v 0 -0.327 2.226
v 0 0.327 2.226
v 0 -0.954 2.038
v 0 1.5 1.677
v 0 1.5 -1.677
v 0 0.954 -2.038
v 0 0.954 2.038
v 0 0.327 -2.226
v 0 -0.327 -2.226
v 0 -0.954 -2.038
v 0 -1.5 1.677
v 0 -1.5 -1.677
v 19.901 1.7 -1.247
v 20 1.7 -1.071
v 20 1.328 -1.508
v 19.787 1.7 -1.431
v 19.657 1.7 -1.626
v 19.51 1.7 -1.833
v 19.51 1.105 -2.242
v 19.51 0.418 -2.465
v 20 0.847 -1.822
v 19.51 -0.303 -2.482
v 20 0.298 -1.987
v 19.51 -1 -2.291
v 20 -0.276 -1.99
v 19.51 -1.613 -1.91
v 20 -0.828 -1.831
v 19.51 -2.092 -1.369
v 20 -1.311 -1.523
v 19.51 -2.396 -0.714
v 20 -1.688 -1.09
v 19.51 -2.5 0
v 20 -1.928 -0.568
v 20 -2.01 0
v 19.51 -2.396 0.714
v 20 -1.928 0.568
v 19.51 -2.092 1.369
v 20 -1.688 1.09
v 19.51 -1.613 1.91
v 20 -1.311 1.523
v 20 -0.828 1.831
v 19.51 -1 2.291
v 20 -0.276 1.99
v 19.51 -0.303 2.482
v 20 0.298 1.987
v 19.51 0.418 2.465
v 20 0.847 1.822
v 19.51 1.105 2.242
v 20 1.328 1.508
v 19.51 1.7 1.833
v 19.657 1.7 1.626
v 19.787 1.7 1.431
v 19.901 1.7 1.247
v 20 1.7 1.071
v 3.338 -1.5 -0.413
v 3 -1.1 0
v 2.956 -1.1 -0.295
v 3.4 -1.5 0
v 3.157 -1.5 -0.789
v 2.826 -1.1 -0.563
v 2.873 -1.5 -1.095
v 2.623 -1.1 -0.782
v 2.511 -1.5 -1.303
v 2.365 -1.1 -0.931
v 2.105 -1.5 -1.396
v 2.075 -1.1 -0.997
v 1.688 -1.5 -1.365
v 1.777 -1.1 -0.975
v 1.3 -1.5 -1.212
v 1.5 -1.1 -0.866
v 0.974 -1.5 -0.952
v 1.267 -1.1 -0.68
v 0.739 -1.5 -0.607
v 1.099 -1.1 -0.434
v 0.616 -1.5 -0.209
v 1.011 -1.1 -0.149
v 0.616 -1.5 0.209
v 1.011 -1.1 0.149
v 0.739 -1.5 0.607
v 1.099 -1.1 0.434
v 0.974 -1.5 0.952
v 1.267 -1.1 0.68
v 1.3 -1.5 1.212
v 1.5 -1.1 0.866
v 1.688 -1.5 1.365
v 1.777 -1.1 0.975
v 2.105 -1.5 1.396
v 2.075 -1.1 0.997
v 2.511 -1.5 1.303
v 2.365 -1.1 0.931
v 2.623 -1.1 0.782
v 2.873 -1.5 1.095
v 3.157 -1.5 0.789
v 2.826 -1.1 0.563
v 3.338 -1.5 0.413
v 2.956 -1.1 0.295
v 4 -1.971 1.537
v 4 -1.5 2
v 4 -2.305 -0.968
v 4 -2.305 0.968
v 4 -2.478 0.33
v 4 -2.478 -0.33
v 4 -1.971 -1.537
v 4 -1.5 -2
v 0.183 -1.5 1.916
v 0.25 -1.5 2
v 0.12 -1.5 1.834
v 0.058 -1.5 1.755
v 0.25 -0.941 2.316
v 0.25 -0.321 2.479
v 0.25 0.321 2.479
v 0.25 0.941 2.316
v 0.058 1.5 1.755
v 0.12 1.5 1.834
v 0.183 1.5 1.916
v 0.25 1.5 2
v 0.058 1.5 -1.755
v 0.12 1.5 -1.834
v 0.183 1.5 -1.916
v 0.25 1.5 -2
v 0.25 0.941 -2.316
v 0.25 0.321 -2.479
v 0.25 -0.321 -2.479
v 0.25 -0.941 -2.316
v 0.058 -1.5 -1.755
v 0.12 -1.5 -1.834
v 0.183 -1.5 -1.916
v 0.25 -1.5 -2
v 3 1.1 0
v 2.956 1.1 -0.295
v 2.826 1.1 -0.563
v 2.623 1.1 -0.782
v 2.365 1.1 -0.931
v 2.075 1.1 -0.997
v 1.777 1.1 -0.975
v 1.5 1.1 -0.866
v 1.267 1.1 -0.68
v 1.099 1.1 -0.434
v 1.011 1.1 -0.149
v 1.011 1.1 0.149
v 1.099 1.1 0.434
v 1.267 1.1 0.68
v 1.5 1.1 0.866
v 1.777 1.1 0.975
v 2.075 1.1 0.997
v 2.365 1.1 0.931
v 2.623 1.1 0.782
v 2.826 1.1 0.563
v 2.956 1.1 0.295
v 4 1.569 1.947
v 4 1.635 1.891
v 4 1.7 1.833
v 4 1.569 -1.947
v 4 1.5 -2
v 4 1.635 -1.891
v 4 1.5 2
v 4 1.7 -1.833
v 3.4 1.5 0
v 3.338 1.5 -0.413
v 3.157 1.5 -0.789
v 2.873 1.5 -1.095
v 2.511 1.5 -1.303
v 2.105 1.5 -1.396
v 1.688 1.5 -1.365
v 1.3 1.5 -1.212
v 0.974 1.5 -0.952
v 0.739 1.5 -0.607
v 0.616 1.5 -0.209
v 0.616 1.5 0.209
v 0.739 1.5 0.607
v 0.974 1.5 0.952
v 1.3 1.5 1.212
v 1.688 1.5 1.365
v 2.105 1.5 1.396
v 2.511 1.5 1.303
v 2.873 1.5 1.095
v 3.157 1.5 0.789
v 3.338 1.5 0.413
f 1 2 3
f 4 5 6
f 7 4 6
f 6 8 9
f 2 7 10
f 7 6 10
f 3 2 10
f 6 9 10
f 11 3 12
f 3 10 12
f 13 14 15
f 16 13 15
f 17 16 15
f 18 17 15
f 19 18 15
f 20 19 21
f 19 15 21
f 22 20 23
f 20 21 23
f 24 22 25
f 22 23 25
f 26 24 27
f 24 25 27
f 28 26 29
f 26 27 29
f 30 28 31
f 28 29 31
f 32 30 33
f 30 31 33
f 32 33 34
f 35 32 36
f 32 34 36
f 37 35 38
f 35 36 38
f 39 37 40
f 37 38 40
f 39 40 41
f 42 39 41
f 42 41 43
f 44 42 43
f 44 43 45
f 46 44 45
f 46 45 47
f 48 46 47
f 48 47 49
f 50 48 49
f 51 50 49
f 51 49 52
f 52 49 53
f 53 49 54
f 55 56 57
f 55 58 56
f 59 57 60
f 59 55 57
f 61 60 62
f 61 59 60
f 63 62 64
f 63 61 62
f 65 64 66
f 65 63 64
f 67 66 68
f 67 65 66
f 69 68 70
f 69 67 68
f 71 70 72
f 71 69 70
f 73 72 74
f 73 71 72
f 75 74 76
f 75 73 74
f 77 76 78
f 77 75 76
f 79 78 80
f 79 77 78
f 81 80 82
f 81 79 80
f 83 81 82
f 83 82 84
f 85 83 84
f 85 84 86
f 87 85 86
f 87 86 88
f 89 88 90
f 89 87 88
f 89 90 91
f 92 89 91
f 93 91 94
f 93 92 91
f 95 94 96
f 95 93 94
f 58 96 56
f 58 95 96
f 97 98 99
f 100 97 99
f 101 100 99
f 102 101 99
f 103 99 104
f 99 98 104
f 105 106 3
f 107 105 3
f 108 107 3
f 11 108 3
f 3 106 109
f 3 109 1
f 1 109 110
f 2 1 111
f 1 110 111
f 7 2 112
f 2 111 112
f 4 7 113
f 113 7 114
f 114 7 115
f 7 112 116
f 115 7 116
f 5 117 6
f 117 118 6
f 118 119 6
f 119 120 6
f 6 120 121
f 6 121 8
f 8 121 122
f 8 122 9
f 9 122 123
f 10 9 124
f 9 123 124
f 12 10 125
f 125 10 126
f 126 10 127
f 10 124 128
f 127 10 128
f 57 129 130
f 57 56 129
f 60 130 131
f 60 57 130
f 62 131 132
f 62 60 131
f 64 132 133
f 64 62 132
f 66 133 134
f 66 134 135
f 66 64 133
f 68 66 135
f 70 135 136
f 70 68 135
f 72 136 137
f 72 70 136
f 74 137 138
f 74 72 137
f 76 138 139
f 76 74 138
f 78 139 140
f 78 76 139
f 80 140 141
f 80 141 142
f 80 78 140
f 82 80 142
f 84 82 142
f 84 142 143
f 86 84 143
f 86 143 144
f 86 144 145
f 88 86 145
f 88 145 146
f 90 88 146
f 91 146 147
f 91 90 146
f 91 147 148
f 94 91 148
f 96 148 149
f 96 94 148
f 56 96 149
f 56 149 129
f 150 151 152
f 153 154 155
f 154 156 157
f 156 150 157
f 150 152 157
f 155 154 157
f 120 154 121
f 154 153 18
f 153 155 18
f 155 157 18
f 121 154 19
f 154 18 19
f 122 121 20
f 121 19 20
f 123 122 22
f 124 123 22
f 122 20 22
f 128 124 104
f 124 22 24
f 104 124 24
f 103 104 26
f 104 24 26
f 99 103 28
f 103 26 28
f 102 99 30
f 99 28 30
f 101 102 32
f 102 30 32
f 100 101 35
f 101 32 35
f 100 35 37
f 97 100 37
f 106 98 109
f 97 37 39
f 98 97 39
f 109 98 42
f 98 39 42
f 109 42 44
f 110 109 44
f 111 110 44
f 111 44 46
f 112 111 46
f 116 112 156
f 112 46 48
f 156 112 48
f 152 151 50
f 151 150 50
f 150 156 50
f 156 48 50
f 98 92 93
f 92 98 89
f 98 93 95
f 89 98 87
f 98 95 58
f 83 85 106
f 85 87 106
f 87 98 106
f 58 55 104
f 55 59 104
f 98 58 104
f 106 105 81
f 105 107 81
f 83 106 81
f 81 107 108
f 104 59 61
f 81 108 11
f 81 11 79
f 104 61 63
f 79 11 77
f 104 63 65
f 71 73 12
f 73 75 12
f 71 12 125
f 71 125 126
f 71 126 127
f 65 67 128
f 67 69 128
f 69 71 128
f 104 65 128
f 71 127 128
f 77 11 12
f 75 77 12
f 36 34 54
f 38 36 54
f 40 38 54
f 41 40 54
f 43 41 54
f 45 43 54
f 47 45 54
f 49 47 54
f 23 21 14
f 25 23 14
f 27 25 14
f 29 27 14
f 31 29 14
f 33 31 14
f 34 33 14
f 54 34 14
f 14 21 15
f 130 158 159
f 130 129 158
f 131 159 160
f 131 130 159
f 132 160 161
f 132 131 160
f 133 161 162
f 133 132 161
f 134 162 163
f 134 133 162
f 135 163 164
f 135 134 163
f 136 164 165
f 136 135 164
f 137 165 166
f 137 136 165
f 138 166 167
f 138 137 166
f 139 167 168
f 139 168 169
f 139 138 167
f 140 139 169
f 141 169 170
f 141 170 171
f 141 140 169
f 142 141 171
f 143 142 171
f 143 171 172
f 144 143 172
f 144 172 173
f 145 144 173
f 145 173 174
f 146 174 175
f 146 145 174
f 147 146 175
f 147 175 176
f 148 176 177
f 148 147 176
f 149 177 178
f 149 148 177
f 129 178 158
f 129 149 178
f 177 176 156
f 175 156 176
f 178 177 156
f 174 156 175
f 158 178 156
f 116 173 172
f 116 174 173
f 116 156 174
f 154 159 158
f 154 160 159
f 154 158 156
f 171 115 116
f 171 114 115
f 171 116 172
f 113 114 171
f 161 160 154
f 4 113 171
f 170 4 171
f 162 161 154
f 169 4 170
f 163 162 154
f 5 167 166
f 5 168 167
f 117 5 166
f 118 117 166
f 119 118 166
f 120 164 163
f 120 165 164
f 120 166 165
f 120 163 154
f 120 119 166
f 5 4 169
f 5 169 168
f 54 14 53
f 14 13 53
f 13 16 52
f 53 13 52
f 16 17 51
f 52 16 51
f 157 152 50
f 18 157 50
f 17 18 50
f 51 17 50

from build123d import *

# Parameters (mm, degrees)
SKETCH2_W               = 20
SKETCH2_H               = 3
CUT_EXTRUDE1_DEPTH      = 4
SKETCH3_W               = 20
SKETCH3_H               = 3
CUT_EXTRUDE2_DEPTH      = 4
SKETCH5_W               = 20
SKETCH5_H               = 0.8
CUT_EXTRUDE3_DEPTH      = 3.5
CUT_EXTRUDE3_DEPTH_BACK = 3.5


with BuildPart() as part:
    # Sketch1 → Revolve1 (revolve)
    with BuildSketch(Plane.XY):
        Polygon((0, 0), (0, 2.25), (0.25, 2.5), (19.5095, 2.5), (20, 2.0095), (20, 0), align=None)
    revolve(axis=Axis((20, 0, 0), (-1, 0, 0)))

    # Sketch2 → Cut-Extrude1 (cut)
    with BuildSketch(Plane(origin=(0, 0, 0), x_dir=(0, 0, -1), z_dir=(1, 0, 0))):
        with Locations((0, 3)):
            Rectangle(SKETCH2_W, SKETCH2_H)
    extrude(amount=CUT_EXTRUDE1_DEPTH, mode=Mode.SUBTRACT)

    # Sketch3 → Cut-Extrude2 (cut)
    with BuildSketch(Plane(origin=(0, 0, 0), x_dir=(0, 0, -1), z_dir=(1, 0, 0))):
        with Locations((0, -3)):
            Rectangle(SKETCH3_W, SKETCH3_H)
    extrude(amount=CUT_EXTRUDE2_DEPTH, mode=Mode.SUBTRACT)

    # Sketch4 → Cut-Revolve1 (revolve, cut)
    with BuildSketch(Plane.XY):
        Polygon((2, 1.5), (3.4, 1.5), (3, 1.1), (3, -1.1), (3.4, -1.5), (2, -1.5), align=None)
    revolve(axis=Axis((2, -1.5, 0), (0, 1, 0)), mode=Mode.SUBTRACT)

    # Sketch5 → Cut-Extrude3 (cut, two sides)
    with BuildSketch(Plane.XY) as cut_extrude3_sk:
        with Locations((10, 2.1)):
            Rectangle(SKETCH5_W, SKETCH5_H)
    extrude(amount=CUT_EXTRUDE3_DEPTH, mode=Mode.SUBTRACT)
    extrude(cut_extrude3_sk.sketch, amount=-CUT_EXTRUDE3_DEPTH_BACK, mode=Mode.SUBTRACT)


solid = part.part
